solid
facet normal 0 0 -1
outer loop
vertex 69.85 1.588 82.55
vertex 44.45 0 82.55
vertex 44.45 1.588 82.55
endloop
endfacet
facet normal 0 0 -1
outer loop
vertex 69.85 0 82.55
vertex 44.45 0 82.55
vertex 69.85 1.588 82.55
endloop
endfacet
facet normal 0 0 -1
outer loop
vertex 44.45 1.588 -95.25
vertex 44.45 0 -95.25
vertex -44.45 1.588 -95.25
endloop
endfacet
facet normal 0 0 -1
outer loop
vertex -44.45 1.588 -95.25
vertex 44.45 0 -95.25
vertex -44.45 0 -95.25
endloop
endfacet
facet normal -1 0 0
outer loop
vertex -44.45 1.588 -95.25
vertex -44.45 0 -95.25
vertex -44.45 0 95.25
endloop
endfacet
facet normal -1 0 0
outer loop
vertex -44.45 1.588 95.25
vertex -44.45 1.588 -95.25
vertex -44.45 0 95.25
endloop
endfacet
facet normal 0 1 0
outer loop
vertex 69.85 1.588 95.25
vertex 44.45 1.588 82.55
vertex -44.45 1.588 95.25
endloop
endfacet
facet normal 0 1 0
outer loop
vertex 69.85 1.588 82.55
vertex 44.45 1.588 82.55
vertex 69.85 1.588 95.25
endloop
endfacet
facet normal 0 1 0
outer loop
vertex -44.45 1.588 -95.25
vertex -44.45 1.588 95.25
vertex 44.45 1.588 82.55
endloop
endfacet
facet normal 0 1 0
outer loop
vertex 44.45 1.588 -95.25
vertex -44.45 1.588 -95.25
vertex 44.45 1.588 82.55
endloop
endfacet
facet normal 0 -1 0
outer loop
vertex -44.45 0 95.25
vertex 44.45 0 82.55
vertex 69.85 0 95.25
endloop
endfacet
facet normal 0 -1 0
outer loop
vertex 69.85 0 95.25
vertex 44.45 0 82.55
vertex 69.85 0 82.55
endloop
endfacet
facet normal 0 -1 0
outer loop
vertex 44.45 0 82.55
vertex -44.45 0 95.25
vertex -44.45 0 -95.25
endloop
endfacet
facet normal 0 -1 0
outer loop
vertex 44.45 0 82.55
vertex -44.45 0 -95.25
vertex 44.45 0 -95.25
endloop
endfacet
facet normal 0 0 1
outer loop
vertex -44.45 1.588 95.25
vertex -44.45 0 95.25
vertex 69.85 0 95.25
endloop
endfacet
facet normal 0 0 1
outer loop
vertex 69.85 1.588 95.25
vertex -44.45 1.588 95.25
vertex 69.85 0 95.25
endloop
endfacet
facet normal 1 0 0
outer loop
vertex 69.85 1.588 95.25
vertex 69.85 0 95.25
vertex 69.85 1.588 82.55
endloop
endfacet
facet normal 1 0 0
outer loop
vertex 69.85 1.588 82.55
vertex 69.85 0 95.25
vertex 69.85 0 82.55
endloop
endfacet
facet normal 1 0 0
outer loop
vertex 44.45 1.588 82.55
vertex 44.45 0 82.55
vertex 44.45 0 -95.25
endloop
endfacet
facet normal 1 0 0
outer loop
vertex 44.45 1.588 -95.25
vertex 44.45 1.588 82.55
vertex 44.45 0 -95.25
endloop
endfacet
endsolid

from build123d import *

# Parameters (mm, degrees)
SKETCH1_W           = 25.4
SKETCH1_H           = 12.7
BOSS_EXTRUDE1_DEPTH = 1.5875


with BuildPart() as part:
    # Sketch1 → Boss-Extrude1 (new body)
    with BuildSketch(Plane(origin=(0, 0, 0), x_dir=(1, 0, 0), z_dir=(0, 1, 0))):
        Polygon((-44.45, -95.25), (44.45, -95.25), (44.45, -82.55), (44.45, 95.25), (-44.45, 95.25), align=None)
        with Locations((57.15, -88.9)):
            Rectangle(SKETCH1_W, SKETCH1_H)
    extrude(amount=BOSS_EXTRUDE1_DEPTH)


solid = part.part
